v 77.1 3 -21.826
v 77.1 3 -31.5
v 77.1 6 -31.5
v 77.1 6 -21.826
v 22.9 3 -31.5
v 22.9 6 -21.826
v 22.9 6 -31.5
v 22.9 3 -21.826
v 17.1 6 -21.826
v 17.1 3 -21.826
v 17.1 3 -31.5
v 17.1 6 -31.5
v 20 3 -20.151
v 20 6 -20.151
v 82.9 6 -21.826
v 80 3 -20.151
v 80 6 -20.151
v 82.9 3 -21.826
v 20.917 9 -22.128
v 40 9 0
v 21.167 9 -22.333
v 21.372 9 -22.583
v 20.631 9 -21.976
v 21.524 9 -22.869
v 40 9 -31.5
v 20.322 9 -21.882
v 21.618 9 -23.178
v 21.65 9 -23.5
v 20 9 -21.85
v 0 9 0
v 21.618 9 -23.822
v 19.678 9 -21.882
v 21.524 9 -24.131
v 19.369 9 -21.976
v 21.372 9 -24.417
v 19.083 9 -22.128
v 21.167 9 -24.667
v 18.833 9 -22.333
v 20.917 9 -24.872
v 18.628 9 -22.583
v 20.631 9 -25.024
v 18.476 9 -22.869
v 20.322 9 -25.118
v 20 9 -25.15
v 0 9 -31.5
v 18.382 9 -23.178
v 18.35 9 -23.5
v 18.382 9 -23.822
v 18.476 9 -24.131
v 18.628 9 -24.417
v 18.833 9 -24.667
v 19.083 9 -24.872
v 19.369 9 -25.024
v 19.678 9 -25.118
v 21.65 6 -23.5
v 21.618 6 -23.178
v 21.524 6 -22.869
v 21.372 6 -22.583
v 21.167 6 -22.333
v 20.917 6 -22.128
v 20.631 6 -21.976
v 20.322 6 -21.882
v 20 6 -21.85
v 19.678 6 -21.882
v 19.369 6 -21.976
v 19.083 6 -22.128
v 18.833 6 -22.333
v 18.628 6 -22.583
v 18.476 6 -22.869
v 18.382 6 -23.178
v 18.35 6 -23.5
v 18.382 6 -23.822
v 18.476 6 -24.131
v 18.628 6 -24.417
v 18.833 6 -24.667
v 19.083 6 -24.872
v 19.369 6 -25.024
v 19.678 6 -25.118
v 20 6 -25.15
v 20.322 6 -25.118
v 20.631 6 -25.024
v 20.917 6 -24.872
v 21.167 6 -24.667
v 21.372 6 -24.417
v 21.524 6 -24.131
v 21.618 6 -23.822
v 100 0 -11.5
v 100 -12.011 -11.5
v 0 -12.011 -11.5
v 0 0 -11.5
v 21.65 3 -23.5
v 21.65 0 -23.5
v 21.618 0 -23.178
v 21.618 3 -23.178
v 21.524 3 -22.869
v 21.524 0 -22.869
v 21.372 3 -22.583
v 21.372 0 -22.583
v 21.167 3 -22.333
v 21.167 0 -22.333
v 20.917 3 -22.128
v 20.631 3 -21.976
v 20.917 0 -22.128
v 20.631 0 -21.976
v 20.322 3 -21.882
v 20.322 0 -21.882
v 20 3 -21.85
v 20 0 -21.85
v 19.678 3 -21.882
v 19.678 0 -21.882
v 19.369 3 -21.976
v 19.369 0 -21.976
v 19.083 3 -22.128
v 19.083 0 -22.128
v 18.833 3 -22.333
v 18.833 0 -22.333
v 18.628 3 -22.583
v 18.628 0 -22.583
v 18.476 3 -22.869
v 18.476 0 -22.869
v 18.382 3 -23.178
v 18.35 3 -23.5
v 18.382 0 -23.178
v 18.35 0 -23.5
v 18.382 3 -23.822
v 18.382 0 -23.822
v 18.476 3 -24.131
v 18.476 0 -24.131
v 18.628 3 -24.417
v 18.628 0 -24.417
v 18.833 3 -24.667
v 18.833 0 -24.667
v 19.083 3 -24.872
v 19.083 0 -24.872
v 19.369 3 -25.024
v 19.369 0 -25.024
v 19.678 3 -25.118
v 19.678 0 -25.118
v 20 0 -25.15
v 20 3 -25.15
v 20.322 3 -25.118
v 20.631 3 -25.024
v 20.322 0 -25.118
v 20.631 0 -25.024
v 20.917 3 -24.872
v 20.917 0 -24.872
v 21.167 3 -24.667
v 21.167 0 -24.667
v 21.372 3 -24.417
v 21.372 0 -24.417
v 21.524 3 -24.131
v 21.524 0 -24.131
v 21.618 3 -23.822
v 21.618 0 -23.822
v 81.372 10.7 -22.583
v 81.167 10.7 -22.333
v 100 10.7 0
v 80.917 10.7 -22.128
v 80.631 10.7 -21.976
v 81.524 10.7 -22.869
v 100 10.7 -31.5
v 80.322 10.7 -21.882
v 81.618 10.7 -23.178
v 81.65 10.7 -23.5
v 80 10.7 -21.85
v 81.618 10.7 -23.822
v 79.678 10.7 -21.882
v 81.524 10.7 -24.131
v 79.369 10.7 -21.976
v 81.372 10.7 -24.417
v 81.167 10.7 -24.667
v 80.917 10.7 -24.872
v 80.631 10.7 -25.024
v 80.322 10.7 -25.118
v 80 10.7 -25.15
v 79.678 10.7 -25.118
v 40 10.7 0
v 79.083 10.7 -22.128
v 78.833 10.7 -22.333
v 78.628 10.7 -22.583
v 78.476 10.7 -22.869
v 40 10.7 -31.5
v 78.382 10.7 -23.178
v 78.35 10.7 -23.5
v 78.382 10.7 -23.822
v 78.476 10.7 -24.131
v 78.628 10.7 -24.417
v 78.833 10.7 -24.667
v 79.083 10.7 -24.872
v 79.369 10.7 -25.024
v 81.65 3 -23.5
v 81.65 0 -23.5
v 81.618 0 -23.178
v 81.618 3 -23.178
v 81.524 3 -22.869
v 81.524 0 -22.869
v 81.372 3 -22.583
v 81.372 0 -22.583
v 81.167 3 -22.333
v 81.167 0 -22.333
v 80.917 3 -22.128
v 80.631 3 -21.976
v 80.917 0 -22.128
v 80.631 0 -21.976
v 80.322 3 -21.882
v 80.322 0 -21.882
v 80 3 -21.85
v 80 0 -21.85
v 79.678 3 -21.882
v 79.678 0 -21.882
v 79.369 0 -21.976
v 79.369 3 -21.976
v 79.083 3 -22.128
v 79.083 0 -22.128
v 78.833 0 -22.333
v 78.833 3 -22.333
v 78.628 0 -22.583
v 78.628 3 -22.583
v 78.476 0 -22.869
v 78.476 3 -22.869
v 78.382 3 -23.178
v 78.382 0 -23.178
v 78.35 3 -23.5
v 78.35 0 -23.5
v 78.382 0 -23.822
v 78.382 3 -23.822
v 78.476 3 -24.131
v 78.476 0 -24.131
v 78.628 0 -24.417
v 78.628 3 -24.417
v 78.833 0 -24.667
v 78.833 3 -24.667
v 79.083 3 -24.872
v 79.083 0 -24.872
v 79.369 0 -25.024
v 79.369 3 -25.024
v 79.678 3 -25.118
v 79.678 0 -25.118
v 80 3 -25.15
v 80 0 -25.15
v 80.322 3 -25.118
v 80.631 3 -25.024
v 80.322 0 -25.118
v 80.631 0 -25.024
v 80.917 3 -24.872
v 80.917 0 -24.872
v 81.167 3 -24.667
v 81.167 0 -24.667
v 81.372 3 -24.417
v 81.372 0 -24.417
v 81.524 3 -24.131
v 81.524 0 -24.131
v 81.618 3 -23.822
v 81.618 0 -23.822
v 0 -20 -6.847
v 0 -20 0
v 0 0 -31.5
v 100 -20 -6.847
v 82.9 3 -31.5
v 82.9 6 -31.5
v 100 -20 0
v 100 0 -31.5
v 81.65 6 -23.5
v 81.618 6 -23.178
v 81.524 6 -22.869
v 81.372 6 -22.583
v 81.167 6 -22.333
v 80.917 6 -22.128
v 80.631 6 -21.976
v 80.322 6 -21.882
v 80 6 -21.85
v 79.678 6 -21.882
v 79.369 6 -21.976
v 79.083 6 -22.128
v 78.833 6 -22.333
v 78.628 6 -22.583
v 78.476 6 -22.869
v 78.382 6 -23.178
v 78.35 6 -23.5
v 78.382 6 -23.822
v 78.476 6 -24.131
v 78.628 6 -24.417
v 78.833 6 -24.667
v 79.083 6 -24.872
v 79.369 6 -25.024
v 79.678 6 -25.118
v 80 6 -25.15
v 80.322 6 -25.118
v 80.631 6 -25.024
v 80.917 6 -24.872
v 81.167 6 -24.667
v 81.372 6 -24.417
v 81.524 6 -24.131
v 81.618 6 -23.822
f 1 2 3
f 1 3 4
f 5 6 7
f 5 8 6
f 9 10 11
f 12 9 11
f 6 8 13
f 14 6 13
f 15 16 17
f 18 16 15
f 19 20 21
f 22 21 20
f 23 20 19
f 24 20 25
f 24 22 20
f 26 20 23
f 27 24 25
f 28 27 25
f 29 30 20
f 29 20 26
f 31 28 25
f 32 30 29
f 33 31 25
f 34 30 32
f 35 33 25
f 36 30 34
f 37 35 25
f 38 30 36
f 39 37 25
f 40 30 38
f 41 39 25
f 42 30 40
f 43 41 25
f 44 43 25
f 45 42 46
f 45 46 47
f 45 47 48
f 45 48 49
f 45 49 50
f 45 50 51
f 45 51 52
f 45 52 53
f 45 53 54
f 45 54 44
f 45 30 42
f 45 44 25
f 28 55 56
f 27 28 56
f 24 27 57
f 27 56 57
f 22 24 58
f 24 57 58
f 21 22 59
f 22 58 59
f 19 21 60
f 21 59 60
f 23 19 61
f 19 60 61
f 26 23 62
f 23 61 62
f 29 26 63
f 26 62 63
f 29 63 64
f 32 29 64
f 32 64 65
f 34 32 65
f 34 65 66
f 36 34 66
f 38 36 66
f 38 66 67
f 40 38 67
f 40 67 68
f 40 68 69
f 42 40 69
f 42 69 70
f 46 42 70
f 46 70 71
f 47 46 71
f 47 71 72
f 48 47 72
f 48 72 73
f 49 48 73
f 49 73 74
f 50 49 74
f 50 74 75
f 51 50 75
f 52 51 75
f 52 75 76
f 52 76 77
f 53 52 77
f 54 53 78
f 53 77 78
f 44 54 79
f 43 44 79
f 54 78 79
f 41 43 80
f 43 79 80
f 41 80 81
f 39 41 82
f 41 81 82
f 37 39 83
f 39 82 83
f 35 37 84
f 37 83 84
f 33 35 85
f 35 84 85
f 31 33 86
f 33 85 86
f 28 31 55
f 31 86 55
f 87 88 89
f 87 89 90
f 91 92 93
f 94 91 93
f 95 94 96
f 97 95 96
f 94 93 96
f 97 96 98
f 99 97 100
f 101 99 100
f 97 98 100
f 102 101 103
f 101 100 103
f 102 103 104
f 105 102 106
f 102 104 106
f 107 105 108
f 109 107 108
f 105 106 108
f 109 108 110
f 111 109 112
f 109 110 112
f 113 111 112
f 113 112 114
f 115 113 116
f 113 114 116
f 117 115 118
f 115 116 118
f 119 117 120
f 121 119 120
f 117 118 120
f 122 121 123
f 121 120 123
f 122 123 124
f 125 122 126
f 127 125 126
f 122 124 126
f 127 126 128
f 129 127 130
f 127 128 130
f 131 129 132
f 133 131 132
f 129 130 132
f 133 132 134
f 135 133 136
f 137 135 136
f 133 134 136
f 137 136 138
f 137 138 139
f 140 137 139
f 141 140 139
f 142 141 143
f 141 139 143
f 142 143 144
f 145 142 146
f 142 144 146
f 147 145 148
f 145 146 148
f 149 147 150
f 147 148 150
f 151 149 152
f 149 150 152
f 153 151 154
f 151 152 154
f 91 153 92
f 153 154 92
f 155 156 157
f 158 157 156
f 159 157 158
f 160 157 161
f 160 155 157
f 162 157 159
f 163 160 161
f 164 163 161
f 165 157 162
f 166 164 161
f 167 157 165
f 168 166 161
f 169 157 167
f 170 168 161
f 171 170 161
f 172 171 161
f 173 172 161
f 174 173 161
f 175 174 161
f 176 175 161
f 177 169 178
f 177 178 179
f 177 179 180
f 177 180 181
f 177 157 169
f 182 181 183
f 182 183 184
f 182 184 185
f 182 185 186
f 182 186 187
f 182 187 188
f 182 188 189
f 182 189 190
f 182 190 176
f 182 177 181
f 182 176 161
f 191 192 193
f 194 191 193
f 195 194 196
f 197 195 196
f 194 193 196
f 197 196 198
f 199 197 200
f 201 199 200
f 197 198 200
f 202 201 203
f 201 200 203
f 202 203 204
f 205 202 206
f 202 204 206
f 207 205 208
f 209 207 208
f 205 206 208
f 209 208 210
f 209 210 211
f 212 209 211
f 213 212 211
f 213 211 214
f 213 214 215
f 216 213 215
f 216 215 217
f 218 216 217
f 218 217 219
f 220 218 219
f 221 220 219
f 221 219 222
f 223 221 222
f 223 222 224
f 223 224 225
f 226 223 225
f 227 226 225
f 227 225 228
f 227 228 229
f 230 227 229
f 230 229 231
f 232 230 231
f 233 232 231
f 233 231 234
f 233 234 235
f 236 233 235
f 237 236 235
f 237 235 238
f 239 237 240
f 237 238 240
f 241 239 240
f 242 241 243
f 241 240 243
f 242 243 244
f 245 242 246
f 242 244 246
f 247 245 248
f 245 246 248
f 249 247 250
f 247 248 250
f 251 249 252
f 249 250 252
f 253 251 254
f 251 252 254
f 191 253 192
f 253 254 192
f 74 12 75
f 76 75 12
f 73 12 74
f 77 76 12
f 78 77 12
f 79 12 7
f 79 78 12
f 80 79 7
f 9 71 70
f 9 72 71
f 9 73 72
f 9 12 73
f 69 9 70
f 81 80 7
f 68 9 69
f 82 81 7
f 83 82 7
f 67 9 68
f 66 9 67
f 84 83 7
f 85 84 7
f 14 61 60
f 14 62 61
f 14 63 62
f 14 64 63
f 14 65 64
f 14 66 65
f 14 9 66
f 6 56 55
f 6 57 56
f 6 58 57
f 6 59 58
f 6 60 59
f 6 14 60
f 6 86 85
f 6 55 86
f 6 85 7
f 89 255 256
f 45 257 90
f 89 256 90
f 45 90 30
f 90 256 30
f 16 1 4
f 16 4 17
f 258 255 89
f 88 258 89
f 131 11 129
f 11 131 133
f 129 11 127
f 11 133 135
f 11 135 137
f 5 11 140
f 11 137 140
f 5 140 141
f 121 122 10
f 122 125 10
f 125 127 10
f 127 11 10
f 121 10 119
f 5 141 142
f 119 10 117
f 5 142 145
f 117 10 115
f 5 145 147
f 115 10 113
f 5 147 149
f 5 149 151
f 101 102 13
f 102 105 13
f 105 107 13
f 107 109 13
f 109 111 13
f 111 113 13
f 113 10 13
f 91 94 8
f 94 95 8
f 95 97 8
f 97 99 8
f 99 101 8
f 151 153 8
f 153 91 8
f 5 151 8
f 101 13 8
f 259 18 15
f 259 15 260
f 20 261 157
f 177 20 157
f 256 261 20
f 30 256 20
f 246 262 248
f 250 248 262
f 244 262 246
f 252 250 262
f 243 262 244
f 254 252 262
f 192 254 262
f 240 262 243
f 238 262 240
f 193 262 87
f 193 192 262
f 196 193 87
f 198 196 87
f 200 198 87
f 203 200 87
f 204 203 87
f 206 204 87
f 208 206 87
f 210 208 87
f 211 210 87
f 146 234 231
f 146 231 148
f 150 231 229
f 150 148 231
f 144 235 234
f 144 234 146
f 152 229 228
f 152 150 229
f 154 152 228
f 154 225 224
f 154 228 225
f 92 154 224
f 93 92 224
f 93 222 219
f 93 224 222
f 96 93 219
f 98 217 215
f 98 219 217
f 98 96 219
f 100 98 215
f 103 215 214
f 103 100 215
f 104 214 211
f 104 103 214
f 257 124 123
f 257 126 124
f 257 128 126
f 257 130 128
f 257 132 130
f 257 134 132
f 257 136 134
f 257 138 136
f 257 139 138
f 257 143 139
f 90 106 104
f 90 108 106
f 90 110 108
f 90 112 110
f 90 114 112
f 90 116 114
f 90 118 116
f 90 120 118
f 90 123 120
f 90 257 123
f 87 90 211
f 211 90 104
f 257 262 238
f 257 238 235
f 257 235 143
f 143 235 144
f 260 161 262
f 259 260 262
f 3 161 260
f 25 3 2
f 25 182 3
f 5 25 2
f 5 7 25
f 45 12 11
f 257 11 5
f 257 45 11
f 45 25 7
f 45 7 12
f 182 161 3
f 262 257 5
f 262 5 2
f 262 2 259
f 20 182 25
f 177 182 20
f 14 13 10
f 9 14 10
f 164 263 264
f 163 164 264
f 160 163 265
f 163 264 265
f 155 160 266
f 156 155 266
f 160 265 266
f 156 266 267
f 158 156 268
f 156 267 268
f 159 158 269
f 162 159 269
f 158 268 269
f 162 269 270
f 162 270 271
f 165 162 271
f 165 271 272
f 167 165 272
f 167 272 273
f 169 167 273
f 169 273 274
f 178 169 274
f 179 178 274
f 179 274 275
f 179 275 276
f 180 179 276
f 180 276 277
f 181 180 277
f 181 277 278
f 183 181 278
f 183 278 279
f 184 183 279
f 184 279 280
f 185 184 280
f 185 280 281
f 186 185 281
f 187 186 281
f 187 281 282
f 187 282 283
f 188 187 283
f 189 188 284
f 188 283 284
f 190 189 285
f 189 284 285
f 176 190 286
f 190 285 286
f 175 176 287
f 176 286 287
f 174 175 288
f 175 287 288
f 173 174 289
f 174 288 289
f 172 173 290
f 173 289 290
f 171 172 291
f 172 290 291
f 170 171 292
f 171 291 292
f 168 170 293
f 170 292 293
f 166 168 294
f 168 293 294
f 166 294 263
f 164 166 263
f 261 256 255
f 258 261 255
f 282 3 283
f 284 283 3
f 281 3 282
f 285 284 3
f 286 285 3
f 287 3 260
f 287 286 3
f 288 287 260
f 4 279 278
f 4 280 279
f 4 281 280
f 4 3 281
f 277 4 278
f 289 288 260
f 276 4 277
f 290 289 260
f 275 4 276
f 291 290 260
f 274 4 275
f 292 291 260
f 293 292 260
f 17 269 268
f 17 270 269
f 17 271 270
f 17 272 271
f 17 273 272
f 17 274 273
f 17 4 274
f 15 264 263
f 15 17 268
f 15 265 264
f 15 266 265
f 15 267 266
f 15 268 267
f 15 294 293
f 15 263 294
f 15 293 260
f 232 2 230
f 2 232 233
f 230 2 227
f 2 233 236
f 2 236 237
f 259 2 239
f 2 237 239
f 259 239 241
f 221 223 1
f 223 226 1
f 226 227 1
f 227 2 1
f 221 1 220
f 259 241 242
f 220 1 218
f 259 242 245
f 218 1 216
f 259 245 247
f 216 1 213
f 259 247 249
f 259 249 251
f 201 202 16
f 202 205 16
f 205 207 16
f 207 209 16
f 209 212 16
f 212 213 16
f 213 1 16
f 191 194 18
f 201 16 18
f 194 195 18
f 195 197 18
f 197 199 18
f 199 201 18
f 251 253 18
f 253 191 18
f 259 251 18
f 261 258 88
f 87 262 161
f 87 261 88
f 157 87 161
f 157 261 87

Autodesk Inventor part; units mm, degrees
ref_plane "YZ Plane" through (0, 0, 0) normal (1, 0, 0) x (0, 1, 0)
ref_plane "XZ Plane" through (0, 0, 0) normal (0, 1, 0) x (-1, 0, 0)
ref_plane "XY Plane" through (0, 0, 0) normal (0, 0, 1) x (1, 0, 0)
sketch "Sketch1" plane through (0, 0, 0) normal (1, 0, 0) x (0, 1, 0)
  line L0 (0, 0) -> (10.7, 0)
  line L1 (10.7, 0) -> (10.7, -31.5)
  line L2 (10.7, -31.5) -> (0, -31.5)
  line L3 (0, -31.5) -> (0, 0)
  line L4 (0, 0) -> (-20, 0)
  line L5 (-20, 0) -> (-20, -11.5)
  line L6 (-20, -11.5) -> (0, -11.5)
  line L7 (0, -11.5) -> (0, 0)
  line L8 (-20, -6.8471) -> (-12.0113, -11.5)
  dimension "d0" = 10.7
  dimension "d1" = 11.5
  dimension "d2" = 20
  dimension "d4" = 20
extrude "Extrusion1" add sketch "Sketch1" along normal blind 100 contours L0 L1 L2 L3 | L3 L6 L8 L5 L4
sketch "Sketch2" plane through (0, 0, 0) normal (-1, 0, 0) x (0, 0, 1)
  line L0 (0, -20) -> (-6.8471, -20) projected
  line L1 (0, 10.7) -> (0, -20) projected
  line L2 (-31.5, 10.7) -> (0, 10.7) projected
  line L3 (-31.5, 0) -> (-31.5, 10.7) projected
  line L4 (-11.5, 0) -> (-31.5, 0) projected
  line L5 (-11.5, -12.0113) -> (-11.5, 0) projected
  line L6 (-6.8471, -20) -> (-11.5, -12.0113) projected
  line L7 (-31.5, 10.7) -> (0, 10.7)
  line L8 (0, 10.7) -> (0, 9)
  line L9 (0, 9) -> (-31.5, 9)
  line L10 (-31.5, 9) -> (-31.5, 10.7)
  point P0 (0, 0)
  dimension "d7" = 1.7
extrude "Extrusion2" cut sketch "Sketch2" against normal blind 40 contours L9 L3 L2 L1
sketch "Sketch3" plane through (0, 0, -31.5) normal (0, -1, 0) x (1, 0, 0)
  line L0 (0, 20) -> (0, 0) projected
  line L1 (0, 0) -> (100, 0) projected
  line L2 (100, 20) -> (100, 0) projected
  line L3 (0, 20) -> (100, 20) projected
  circle A0 centre (80, 8) radius 1.65
  line L4 (50, 0) -> (50, 9.65)
  circle A1 centre (20, 8) radius 1.65
  point P0 (0, 31.5)
  dimension "d10" = 3.3
  dimension "d11" = 8
  dimension "d12" = 20
extrude "Extrusion3" cut sketch "Sketch3" against normal blind 40 contours A0 | A1
ref_plane "Work Plane1" through (0, 3, -31.5) normal (0, -1, 0) x (1, 0, 0)
sketch "Sketch4" plane through (0, 3, -31.5) normal (0, -1, 0) x (1, 0, 0)
  circle A0 centre (80, 8) radius 1.65 projected
  circle A1 centre (20, 8) radius 1.65 projected
  line L0 (80, 4.6514) -> (77.1, 6.3257)
  line L1 (77.1, 6.3257) -> (77.1, 9.6743)
  line L2 (77.1, 9.6743) -> (80, 11.3486)
  line L3 (80, 11.3486) -> (82.9, 9.6743)
  line L4 (82.9, 9.6743) -> (82.9, 6.3257)
  line L5 (82.9, 6.3257) -> (80, 4.6514)
  line L6 (82.9, 6.3257) -> (82.9, 0)
  line L7 (40, 0) -> (100, 0) projected
  line L8 (77.1, 6.3257) -> (77.1, 0)
  line L9 (82.9, 0) -> (77.1, 0)
  line L10 (0, 0) -> (100, 0) projected
  line L11 (50, 0) -> (50, 11.3486)
  circle A2 centre (20, 8) radius 1.65
  line L12 (20, 4.6514) -> (22.9, 6.3257)
  line L13 (22.9, 6.3257) -> (22.9, 9.6743)
  line L14 (22.9, 9.6743) -> (20, 11.3486)
  line L15 (20, 11.3486) -> (17.1, 9.6743)
  line L16 (17.1, 9.6743) -> (17.1, 6.3257)
  line L17 (17.1, 6.3257) -> (20, 4.6514)
  line L18 (17.1, 6.3257) -> (17.1, 0)
  line L19 (22.9, 6.3257) -> (22.9, 0)
  line L20 (17.1, 0) -> (22.9, 0)
  point P0 (0, 31.5)
  point P1 (17.1, 0)
  point P2 (22.9, 0)
  dimension "d16" = 5.8
extrude "Extrusion4" cut sketch "Sketch4" against normal blind 3 contours A0 | L5 L6 L7 L8 L0 | L0 L1 L2 L3 L4 L5 | L10 L18 L17 L12 L19 | L12 L17 L16 L15 L14 L13
properties part number "ESQUINA_RECTA_SUPERIOR" material "Steel, Mild, Welded"
